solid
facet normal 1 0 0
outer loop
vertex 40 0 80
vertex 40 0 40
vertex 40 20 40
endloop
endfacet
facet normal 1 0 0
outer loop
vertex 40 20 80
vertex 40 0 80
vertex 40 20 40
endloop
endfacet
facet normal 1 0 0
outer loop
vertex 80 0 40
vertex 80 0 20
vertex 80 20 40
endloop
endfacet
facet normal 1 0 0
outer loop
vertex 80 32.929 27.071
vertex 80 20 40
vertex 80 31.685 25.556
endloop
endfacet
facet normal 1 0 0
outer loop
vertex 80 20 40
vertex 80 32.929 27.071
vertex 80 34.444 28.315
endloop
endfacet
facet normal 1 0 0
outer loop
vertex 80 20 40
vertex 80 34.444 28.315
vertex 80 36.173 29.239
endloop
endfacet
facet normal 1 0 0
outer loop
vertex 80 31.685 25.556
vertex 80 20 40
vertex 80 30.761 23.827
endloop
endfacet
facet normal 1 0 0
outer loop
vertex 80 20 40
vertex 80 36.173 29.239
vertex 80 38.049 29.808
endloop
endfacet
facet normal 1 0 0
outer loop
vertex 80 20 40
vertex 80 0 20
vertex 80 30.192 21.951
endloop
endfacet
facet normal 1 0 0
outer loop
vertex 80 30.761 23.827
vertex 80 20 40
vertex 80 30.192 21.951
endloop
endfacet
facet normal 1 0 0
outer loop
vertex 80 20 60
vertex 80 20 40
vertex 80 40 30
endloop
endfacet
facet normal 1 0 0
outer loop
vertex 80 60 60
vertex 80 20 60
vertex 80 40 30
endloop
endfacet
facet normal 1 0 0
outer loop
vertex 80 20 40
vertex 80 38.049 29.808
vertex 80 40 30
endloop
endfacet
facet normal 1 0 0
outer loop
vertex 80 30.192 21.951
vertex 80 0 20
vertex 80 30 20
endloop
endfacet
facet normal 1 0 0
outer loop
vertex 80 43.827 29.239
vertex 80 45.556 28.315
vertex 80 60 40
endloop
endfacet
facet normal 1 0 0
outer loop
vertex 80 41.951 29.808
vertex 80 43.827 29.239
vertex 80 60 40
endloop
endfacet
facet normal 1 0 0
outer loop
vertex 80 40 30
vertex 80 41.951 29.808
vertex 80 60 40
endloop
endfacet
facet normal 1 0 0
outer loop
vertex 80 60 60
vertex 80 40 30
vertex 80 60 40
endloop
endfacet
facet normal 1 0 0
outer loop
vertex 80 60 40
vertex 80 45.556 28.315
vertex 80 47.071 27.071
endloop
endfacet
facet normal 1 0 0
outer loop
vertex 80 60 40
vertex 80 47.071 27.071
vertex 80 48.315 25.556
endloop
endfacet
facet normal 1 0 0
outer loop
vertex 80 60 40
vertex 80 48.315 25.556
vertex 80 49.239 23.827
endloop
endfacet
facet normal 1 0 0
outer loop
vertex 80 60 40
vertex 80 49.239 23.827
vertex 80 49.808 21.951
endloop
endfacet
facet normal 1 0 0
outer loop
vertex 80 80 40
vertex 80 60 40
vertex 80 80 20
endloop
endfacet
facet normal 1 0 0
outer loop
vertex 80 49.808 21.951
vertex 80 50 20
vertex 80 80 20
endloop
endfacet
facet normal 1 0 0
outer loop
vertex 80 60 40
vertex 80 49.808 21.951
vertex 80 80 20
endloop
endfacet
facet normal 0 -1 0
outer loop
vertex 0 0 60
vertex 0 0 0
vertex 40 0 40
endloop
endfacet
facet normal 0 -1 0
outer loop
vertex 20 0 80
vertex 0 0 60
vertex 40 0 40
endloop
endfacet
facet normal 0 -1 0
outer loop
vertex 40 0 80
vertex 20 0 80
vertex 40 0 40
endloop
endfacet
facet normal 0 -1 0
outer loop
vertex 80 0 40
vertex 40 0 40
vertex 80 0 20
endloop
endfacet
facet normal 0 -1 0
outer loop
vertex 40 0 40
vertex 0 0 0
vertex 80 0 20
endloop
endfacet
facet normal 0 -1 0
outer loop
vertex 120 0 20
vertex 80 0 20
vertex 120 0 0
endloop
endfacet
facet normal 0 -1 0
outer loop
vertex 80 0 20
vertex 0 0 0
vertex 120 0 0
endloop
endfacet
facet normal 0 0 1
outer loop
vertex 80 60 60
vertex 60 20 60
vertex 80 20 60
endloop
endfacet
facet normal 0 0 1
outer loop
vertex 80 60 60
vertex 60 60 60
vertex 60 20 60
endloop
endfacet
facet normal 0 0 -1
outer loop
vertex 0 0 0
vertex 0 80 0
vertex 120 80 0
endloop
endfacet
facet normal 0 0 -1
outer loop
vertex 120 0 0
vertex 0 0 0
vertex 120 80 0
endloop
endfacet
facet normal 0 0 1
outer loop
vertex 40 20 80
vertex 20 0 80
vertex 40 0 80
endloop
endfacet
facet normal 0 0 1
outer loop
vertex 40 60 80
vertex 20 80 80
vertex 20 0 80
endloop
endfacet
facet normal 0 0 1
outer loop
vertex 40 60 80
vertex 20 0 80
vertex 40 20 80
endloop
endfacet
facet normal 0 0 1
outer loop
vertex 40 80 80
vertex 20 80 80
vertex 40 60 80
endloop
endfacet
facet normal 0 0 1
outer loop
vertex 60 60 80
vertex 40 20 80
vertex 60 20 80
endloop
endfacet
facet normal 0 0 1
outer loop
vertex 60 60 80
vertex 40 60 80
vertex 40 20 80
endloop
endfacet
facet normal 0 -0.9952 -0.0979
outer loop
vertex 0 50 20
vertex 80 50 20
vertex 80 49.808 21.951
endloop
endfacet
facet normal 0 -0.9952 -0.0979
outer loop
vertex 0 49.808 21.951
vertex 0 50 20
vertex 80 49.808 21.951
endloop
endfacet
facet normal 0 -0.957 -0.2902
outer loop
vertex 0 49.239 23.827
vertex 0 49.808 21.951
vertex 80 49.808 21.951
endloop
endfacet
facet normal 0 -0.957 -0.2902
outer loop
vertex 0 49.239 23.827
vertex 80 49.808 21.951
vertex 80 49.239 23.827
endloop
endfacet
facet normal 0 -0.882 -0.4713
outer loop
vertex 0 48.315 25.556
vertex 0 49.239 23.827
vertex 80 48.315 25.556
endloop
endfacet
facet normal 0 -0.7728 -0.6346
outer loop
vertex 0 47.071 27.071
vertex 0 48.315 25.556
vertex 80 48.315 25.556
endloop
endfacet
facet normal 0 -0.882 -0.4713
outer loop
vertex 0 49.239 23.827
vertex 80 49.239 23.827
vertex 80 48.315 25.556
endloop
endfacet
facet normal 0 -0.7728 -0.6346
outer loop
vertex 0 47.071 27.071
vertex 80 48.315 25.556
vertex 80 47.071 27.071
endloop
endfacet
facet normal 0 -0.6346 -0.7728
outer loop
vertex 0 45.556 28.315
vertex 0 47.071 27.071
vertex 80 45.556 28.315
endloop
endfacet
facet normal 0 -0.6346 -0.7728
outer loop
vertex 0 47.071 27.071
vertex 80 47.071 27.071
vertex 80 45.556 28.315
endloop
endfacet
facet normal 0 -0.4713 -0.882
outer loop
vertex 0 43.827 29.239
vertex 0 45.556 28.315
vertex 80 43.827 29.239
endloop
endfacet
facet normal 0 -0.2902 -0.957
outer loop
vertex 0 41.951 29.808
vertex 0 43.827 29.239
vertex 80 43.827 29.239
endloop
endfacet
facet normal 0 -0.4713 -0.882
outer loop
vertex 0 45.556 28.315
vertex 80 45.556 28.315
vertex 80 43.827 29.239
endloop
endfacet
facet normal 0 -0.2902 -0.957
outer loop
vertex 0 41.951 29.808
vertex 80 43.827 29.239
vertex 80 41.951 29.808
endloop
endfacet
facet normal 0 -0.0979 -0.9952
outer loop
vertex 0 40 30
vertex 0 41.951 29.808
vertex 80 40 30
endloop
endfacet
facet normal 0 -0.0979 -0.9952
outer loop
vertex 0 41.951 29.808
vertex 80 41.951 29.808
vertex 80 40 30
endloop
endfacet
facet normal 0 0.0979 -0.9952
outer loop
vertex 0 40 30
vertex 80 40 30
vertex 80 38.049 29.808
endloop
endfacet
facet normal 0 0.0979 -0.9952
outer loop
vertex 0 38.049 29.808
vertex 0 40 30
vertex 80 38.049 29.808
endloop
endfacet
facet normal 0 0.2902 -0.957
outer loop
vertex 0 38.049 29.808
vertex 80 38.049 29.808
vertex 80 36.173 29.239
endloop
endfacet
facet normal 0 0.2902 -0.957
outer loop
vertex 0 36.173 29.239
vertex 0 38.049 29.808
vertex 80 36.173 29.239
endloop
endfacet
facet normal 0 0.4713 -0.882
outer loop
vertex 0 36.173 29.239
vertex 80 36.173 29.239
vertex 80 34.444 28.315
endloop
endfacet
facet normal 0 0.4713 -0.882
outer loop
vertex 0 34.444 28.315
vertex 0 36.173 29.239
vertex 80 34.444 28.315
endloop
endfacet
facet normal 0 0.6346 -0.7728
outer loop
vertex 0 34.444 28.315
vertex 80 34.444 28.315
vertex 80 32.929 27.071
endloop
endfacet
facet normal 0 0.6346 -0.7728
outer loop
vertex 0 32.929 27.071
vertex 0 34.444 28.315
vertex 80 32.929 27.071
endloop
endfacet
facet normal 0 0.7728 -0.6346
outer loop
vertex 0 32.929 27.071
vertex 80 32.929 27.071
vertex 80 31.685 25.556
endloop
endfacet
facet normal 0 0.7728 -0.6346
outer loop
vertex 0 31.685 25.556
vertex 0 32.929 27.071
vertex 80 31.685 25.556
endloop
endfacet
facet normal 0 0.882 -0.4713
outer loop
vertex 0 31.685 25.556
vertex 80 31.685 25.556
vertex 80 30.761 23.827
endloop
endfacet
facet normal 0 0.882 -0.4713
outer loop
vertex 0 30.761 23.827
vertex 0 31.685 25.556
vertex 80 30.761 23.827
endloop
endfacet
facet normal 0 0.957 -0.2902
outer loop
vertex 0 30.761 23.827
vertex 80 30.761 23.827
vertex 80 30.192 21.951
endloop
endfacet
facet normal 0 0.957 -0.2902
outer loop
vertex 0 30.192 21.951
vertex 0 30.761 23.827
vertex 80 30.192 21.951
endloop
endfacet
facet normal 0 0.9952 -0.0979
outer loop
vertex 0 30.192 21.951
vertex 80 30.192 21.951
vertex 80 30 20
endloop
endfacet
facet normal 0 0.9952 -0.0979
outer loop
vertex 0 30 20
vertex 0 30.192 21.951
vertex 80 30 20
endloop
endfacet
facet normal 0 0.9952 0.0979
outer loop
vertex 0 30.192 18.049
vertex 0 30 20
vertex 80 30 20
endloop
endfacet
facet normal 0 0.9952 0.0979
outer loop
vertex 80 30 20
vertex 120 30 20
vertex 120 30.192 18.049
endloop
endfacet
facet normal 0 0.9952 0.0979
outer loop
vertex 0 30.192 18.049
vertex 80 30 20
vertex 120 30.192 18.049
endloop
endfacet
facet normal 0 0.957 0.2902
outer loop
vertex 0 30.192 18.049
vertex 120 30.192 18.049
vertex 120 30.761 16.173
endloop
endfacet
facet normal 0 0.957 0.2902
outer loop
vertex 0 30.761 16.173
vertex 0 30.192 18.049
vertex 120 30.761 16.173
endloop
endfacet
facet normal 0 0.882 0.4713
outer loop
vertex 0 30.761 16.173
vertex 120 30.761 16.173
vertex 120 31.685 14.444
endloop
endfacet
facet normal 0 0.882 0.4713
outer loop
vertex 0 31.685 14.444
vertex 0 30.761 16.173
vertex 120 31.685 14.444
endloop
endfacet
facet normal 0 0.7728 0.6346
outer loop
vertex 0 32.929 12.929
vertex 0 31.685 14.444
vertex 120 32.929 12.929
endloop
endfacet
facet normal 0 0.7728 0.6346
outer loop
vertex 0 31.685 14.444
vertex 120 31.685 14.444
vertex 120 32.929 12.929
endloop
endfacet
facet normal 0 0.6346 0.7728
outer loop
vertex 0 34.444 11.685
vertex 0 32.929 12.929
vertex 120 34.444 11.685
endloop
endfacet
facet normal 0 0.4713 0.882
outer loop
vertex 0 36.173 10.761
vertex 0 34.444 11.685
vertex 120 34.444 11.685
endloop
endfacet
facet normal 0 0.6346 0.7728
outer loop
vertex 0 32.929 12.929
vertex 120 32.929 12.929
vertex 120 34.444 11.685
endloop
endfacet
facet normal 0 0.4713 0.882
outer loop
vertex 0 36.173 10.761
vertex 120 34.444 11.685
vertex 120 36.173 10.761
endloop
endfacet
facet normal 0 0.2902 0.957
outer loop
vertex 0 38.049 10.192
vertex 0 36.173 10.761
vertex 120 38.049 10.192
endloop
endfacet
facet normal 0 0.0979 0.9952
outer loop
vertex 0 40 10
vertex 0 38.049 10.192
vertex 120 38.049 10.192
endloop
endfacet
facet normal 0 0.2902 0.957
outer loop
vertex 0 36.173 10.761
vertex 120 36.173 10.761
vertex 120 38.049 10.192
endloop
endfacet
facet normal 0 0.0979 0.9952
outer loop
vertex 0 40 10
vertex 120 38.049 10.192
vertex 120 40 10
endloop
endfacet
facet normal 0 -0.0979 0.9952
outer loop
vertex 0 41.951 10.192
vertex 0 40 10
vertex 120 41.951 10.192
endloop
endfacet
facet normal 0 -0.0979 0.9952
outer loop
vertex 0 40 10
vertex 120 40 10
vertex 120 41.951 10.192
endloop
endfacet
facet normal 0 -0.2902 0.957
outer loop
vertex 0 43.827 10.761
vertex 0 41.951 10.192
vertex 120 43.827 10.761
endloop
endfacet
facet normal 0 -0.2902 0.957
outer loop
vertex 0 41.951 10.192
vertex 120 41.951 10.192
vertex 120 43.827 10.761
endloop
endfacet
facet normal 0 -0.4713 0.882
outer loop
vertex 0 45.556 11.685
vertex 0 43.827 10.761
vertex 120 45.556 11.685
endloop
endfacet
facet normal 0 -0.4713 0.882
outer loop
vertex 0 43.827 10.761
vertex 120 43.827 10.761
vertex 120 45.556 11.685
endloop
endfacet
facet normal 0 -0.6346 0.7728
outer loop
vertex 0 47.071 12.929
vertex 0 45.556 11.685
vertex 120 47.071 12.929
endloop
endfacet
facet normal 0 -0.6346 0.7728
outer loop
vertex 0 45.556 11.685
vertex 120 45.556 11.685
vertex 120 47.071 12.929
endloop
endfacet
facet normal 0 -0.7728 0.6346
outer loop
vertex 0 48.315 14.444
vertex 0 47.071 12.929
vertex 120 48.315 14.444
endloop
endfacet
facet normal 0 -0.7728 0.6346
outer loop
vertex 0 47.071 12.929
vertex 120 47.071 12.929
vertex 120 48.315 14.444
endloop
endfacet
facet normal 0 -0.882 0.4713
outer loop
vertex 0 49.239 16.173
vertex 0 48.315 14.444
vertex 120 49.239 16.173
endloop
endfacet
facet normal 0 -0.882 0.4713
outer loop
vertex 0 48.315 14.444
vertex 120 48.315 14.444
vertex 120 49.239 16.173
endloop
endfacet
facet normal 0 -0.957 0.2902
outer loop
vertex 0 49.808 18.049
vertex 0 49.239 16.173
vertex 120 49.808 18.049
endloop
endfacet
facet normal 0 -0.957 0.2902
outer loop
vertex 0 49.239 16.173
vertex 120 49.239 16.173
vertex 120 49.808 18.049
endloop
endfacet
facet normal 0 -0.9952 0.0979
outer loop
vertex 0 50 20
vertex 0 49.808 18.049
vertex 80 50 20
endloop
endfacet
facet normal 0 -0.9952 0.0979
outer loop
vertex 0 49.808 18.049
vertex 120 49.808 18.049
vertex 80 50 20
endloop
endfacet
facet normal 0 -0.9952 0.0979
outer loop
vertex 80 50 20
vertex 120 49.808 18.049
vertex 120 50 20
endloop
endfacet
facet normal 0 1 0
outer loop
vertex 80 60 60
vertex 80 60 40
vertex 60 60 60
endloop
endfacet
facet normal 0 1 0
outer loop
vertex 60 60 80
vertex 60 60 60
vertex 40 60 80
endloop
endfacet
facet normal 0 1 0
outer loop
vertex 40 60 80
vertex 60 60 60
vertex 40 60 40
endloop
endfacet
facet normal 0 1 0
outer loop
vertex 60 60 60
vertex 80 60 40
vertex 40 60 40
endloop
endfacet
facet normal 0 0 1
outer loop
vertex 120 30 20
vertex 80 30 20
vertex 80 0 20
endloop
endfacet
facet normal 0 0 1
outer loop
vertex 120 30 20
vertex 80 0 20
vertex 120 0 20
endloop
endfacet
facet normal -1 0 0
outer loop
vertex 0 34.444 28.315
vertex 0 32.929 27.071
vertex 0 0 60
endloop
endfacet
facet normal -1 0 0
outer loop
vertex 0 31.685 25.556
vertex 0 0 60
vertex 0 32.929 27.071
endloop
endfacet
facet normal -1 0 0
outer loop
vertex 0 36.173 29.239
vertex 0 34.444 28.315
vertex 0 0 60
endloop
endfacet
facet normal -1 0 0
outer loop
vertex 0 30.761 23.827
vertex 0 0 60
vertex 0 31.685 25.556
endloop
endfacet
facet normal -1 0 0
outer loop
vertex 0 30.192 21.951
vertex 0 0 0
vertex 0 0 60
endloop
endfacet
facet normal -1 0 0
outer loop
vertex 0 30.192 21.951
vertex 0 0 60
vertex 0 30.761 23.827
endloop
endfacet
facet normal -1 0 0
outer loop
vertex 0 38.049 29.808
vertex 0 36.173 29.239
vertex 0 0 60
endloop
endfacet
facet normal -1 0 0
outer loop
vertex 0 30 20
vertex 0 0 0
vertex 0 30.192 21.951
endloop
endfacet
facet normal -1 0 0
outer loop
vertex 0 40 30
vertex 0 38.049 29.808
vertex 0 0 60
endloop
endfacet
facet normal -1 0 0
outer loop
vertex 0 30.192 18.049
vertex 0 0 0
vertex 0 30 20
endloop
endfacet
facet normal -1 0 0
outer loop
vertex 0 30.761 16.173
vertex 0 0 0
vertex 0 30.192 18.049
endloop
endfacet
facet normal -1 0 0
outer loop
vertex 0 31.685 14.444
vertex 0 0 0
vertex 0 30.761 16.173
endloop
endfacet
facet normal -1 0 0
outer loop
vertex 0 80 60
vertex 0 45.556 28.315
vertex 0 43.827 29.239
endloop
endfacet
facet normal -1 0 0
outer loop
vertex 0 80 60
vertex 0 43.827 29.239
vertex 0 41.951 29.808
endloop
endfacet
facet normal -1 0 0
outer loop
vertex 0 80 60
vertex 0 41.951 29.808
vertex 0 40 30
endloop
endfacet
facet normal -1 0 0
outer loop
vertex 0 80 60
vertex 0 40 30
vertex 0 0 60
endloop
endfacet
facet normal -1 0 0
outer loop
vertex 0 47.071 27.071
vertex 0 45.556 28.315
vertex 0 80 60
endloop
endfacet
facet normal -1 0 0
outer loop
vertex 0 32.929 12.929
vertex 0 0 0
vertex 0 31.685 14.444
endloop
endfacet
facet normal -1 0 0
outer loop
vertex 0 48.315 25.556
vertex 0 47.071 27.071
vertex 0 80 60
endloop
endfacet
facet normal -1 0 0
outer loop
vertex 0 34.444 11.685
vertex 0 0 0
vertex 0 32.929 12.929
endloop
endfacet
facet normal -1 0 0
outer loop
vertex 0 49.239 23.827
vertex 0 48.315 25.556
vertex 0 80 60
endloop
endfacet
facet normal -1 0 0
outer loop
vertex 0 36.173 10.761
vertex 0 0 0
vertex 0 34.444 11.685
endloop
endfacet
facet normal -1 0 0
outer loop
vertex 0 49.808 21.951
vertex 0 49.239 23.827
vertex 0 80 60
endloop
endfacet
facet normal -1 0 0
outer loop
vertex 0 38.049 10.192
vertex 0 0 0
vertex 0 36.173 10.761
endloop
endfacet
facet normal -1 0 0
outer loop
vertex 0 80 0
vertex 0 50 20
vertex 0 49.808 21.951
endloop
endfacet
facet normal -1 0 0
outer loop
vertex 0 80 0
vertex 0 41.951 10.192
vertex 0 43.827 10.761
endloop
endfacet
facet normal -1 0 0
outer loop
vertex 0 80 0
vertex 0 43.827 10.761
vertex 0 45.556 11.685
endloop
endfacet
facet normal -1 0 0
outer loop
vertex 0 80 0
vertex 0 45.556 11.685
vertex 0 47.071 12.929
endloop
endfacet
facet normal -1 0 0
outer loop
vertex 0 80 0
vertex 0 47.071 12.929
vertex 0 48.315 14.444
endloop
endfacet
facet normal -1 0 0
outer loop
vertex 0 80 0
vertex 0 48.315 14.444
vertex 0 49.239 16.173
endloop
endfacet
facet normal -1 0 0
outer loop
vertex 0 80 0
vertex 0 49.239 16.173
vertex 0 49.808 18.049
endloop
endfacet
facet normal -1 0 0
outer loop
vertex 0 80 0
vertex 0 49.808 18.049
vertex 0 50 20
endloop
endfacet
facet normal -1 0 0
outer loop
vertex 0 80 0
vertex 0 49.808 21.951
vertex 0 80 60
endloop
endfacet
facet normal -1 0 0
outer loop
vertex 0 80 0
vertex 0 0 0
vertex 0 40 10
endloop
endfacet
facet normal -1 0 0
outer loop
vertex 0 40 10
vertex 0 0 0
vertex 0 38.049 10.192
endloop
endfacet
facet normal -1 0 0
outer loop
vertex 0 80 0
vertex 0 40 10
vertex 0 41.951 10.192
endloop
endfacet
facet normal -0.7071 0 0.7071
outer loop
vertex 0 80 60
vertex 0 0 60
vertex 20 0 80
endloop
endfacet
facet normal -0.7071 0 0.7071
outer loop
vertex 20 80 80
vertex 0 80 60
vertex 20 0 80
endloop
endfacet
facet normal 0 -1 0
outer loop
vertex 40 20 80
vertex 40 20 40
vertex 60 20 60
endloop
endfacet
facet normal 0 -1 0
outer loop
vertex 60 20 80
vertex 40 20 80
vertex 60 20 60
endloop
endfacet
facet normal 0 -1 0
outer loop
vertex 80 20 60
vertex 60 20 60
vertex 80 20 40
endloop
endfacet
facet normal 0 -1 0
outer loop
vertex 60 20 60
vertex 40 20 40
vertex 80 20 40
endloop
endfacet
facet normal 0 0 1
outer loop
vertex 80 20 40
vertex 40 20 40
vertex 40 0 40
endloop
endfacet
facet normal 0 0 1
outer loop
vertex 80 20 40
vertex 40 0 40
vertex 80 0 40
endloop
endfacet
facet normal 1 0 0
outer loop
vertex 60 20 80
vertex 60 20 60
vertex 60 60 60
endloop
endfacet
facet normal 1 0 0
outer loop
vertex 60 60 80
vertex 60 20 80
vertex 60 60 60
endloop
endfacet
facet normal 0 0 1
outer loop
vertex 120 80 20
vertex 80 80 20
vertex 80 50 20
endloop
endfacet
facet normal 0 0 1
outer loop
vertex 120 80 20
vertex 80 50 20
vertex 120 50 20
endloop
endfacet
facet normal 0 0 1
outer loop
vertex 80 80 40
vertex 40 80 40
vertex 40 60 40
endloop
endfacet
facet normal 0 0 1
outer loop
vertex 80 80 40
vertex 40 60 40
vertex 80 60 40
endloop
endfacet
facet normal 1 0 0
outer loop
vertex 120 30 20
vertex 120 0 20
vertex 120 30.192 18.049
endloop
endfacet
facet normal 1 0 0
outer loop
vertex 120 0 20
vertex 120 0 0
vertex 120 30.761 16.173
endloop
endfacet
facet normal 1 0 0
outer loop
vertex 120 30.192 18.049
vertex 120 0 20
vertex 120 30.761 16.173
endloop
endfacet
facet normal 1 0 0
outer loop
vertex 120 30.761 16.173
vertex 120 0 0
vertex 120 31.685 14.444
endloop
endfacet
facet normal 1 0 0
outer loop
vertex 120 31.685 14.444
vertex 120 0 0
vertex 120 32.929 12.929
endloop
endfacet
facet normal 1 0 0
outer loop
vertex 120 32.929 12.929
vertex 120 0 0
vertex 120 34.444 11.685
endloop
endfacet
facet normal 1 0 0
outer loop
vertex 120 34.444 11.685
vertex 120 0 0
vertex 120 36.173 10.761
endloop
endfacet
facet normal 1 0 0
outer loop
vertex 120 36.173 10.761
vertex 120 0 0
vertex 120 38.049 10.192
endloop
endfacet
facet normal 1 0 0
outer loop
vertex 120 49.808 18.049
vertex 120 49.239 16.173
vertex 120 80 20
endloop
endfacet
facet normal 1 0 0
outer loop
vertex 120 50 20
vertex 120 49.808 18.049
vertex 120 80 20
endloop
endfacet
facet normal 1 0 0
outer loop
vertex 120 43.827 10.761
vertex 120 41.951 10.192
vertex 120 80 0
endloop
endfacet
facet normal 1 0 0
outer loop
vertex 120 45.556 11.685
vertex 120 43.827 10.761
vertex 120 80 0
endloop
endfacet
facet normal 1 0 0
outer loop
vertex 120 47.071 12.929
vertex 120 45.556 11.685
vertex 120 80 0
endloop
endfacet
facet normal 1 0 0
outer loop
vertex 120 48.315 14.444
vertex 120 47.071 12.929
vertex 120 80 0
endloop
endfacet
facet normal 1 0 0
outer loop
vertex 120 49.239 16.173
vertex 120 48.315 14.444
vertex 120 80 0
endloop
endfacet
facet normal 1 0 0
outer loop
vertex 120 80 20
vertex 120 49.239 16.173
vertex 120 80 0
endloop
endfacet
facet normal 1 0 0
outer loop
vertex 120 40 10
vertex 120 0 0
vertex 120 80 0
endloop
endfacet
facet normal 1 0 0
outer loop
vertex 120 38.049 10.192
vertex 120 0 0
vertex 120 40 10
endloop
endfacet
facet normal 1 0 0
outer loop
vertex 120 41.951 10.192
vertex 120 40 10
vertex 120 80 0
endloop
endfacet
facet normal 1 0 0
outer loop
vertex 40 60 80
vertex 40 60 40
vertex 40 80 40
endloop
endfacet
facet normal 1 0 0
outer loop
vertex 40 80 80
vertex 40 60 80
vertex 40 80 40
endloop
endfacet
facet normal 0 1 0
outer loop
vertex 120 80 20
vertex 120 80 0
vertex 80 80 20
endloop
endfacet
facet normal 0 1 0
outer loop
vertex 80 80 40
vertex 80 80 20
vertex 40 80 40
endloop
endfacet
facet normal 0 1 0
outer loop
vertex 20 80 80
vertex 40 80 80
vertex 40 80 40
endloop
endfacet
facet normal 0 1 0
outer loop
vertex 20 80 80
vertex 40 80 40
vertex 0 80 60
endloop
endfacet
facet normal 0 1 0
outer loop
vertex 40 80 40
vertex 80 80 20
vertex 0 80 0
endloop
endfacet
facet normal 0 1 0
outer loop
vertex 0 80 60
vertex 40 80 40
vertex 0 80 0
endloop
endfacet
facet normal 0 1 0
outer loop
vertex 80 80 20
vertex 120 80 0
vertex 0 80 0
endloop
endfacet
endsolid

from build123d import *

# Parameters (mm, degrees)
F0_W     = 20
F0_H     = 80
F1_DEPTH = 80
F2_DEPTH = 40
F3_DEPTH = 60
F5_DEPTH = 80
F0_W_2   = 40
F0_H_2   = 20
F6_DEPTH = 20
F7_R     = 10
F8_DEPTH = 120


with BuildPart() as f1:
    # F0 (on Top) → F1 (new body)
    with BuildSketch(Plane.XY):
        with Locations((10, 40)):
            Rectangle(F0_W, F0_H)
        Polygon((20, 80), (20, 0), (40, 0), (40, 20), (60, 20), (60, 60), (40, 60), (40, 80), align=None)
    extrude(amount=F1_DEPTH)

    # F0 (on Top) → F2 (join)
    with BuildSketch(Plane.XY):
        Polygon((80, 80), (40, 80), (40, 60), (60, 60), (80, 60), align=None)
        Polygon((40, 20), (40, 0), (80, 0), (80, 20), (60, 20), align=None)
    extrude(amount=F2_DEPTH)

    # F0 (on Top) → F3 (join)
    with BuildSketch(Plane.XY):
        Polygon((60, 20), (80, 20), (80, 30), (80, 50), (80, 60), (60, 60), align=None)
    extrude(amount=F3_DEPTH)

    # F4 (on face) → F5 (cut)
    with BuildSketch(Plane.XZ):
        Polygon((20, 80), (0, 80), (0, 60), align=None)
    extrude(amount=-F5_DEPTH, mode=Mode.SUBTRACT)

    # F0 (on Top) → F6 (join)
    with BuildSketch(Plane.XY):
        Polygon((120, 80), (80, 80), (80, 60), (80, 50), (120, 50), align=None)
        Polygon((80, 20), (80, 0), (120, 0), (120, 30), (80, 30), align=None)
        with Locations((100, 40)):
            Rectangle(F0_W_2, F0_H_2)
    extrude(amount=F6_DEPTH)

    # F7 (on face) → F8 (cut)
    with BuildSketch(Plane.YZ.offset(120)):
        with Locations((40, 20)):
            Circle(F7_R)
    extrude(amount=-F8_DEPTH, mode=Mode.SUBTRACT)


solid = f1.part
